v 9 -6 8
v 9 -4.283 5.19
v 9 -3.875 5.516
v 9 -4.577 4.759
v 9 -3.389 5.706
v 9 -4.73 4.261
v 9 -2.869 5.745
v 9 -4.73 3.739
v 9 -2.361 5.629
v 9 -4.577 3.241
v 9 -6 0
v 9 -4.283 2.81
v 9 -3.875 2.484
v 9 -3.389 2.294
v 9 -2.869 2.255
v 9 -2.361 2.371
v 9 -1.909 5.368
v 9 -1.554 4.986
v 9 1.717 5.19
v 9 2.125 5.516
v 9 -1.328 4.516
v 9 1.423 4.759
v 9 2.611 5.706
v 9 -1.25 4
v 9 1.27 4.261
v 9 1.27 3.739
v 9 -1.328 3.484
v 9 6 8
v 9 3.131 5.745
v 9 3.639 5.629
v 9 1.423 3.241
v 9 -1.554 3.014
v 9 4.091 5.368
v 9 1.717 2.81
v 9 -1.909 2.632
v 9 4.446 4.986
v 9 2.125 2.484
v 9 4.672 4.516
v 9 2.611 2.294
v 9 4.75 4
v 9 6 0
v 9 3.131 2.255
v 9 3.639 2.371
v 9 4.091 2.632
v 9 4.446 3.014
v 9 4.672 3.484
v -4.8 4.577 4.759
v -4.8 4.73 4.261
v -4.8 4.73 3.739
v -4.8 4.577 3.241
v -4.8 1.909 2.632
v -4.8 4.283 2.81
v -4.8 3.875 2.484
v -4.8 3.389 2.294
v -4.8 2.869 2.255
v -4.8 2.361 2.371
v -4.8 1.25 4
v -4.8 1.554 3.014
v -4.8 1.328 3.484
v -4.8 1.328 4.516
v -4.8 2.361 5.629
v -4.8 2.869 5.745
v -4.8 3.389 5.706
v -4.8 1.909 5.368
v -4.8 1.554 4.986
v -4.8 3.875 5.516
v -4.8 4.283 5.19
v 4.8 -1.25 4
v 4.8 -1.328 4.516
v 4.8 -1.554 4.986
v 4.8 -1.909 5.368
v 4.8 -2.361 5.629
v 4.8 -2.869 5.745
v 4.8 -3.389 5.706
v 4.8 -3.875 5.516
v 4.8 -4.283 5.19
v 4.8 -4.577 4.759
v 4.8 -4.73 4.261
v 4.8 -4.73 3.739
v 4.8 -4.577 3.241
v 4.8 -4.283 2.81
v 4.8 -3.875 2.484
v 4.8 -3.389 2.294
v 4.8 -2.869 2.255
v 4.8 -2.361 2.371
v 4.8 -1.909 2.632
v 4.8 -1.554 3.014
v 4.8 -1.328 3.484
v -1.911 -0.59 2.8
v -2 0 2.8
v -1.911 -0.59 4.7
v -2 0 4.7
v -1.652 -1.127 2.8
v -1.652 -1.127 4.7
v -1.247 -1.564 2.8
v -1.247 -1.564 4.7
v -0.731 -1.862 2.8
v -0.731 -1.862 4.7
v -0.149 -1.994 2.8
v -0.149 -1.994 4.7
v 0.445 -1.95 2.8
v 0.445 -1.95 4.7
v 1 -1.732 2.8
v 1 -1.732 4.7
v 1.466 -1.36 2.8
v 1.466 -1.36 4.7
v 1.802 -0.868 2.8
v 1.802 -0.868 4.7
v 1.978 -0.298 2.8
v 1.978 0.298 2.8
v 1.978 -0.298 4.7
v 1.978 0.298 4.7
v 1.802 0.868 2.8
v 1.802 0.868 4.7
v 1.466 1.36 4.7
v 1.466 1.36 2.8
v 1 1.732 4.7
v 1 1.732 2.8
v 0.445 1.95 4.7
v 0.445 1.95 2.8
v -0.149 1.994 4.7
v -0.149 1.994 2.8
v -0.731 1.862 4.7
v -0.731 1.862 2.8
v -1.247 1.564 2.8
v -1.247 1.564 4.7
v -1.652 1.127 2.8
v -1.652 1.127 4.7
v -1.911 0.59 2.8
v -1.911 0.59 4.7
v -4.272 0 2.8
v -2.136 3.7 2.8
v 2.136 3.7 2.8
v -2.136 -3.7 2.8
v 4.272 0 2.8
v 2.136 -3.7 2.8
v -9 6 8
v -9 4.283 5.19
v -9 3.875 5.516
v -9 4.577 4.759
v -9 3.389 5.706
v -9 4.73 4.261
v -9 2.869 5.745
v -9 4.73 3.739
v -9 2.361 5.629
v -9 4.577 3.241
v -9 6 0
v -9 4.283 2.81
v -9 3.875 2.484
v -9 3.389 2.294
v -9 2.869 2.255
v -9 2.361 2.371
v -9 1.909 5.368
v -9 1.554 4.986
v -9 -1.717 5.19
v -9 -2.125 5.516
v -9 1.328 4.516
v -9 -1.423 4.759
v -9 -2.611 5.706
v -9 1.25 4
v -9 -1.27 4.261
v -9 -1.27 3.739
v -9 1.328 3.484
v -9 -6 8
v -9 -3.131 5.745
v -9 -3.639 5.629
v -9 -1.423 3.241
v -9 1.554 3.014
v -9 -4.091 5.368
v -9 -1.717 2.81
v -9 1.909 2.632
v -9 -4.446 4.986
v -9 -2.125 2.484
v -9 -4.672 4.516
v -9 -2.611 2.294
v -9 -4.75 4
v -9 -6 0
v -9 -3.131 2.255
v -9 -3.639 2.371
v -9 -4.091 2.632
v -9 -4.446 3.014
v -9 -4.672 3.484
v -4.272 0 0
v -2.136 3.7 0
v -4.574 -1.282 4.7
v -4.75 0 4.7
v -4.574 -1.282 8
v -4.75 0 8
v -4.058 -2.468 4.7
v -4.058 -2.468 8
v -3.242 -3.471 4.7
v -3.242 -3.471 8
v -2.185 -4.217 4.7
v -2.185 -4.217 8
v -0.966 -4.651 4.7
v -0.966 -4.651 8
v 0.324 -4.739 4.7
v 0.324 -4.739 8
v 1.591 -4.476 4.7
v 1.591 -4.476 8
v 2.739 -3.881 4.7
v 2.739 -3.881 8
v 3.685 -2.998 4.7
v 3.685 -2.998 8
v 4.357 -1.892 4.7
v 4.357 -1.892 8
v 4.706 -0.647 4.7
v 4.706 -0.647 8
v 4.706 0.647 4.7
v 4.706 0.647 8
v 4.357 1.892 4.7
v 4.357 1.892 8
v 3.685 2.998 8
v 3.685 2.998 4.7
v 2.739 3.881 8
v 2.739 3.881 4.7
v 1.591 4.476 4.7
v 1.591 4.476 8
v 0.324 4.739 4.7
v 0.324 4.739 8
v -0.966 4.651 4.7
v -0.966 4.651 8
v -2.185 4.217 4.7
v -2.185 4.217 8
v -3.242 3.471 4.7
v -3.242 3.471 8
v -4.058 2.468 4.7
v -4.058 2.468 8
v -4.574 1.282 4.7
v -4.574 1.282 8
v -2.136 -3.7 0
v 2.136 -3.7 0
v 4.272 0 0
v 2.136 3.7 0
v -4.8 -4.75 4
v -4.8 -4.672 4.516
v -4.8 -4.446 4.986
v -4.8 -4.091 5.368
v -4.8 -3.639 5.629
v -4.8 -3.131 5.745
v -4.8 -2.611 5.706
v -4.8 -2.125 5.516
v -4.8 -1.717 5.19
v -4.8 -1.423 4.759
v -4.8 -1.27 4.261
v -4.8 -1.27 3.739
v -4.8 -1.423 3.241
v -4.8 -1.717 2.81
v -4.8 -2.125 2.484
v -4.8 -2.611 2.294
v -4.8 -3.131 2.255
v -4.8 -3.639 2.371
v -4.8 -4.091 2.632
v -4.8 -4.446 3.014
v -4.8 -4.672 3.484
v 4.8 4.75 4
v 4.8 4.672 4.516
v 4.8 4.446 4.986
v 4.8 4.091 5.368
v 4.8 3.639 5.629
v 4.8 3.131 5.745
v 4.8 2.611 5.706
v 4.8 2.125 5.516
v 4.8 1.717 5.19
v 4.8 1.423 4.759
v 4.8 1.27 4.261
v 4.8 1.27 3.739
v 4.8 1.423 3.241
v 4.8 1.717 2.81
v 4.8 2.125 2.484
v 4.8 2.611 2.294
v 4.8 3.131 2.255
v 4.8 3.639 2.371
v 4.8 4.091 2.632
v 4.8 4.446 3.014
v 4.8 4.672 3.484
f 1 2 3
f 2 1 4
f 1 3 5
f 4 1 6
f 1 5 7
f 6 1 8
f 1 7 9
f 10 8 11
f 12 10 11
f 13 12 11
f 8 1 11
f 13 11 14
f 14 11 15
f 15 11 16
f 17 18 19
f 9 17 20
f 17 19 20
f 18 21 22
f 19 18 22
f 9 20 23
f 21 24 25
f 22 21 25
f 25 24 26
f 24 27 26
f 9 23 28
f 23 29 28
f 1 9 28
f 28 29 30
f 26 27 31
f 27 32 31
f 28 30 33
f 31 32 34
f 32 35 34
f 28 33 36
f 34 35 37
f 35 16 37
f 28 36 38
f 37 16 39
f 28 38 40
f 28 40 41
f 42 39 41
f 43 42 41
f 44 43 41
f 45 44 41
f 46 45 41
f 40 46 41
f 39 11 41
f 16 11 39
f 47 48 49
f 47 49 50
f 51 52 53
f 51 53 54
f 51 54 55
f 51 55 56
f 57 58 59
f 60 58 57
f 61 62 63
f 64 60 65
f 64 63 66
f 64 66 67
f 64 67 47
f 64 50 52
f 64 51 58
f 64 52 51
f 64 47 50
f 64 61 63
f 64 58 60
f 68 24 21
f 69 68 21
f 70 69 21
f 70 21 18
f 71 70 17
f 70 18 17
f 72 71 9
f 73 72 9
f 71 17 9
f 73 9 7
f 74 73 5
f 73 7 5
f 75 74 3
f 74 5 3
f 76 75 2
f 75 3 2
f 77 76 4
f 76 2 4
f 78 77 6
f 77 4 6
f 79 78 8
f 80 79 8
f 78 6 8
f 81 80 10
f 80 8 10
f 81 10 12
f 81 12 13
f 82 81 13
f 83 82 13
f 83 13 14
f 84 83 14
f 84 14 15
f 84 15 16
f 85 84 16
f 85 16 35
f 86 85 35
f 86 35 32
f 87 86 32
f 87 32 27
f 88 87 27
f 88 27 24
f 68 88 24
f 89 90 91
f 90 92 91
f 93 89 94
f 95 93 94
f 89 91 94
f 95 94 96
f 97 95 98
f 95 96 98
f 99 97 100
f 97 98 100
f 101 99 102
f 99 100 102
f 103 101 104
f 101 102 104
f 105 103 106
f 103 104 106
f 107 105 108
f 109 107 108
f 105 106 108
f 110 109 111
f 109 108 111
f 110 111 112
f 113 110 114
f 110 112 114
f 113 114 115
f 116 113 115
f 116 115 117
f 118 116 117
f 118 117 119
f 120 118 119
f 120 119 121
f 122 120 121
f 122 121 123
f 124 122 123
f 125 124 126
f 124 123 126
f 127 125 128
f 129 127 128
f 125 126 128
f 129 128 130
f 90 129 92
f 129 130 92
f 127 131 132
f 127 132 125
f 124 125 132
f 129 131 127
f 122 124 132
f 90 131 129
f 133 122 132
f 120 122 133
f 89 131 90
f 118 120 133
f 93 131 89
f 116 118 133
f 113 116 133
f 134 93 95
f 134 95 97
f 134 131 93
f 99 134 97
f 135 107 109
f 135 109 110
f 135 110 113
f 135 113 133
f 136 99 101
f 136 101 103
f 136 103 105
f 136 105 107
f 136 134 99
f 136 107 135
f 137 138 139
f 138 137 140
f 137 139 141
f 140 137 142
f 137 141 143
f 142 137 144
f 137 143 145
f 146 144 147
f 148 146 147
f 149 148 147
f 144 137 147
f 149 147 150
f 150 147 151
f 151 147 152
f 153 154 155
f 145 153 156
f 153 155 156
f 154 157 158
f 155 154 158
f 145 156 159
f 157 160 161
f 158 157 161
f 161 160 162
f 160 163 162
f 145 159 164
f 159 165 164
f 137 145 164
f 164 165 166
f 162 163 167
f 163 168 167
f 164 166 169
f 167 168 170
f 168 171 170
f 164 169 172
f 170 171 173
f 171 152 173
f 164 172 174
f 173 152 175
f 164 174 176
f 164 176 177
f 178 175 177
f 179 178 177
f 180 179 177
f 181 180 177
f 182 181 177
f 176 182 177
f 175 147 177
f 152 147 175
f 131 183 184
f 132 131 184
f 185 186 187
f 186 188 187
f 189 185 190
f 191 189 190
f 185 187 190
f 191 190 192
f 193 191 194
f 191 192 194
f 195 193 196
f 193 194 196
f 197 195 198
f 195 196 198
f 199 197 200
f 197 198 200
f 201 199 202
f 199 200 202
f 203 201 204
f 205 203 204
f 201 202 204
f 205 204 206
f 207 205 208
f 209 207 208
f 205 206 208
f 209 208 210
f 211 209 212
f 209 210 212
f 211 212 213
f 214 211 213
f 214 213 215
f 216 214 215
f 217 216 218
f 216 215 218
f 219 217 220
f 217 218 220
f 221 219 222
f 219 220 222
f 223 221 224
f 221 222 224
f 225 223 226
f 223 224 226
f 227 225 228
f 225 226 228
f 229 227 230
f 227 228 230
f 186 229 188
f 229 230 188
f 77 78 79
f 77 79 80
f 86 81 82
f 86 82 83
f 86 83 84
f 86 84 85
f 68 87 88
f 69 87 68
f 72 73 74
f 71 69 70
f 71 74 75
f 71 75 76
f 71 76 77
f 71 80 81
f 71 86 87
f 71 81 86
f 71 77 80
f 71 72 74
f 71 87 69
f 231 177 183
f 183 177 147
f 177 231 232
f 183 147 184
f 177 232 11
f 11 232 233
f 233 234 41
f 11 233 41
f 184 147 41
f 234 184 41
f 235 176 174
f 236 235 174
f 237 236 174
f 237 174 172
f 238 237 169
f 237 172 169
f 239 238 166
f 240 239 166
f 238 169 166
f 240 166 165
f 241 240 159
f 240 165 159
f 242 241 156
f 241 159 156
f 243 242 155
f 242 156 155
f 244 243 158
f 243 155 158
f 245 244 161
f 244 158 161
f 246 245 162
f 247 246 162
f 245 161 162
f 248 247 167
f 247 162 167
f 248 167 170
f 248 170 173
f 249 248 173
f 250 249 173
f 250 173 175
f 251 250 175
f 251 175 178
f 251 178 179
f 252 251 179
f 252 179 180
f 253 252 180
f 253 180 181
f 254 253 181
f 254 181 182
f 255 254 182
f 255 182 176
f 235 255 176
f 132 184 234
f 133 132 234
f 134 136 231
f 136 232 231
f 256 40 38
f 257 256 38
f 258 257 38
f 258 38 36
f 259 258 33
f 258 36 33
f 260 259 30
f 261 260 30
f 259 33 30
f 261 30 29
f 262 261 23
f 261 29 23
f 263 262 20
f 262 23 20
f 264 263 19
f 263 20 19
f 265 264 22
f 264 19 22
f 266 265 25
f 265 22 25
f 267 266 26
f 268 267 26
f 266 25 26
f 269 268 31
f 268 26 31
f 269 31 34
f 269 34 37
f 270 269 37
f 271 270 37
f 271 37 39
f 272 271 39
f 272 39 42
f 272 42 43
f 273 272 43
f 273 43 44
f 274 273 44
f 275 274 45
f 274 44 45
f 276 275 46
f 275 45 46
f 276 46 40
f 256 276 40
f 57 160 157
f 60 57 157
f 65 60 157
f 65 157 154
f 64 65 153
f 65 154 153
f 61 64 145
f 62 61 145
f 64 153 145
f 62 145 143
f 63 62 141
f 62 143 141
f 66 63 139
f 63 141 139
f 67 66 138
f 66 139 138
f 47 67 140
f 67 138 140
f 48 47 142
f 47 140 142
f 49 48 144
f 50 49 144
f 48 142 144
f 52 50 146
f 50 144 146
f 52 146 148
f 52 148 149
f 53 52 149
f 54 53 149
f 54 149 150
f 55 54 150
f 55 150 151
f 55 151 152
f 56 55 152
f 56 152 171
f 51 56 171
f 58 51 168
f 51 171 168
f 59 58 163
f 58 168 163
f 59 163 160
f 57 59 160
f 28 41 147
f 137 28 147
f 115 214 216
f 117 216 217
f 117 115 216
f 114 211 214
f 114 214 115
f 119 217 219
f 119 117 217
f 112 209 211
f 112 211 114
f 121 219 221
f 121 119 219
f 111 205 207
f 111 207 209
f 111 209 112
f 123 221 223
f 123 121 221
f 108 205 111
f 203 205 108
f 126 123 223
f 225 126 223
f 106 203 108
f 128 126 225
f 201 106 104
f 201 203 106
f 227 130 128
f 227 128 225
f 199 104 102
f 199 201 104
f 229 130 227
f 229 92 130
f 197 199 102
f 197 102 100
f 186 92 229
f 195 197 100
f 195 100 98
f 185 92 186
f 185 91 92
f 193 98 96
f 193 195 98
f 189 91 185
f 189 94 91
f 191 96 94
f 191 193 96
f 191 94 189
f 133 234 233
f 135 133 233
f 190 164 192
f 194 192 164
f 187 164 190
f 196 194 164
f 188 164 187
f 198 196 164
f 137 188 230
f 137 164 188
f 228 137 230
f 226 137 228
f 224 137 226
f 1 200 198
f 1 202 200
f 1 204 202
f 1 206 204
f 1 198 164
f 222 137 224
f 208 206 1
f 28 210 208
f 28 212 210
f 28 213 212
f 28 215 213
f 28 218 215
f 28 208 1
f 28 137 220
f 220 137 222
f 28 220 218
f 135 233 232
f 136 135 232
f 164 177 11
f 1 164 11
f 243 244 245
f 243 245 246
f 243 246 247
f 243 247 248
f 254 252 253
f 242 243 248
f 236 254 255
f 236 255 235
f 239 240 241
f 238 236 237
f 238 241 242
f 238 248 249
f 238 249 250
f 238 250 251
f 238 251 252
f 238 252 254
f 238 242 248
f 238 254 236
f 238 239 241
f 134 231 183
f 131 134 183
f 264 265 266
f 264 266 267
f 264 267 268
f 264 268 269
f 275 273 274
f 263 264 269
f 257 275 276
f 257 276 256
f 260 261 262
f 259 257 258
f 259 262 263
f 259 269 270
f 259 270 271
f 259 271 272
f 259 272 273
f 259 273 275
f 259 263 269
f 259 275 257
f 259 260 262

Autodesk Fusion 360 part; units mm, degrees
sketch "Sketch1" plane through (0, 0, 0) normal (0, 0, 1) x (1, 0, 0)
  line L0 (-9, -6) -> (9, -6)
  line L1 (9, -6) -> (9, 6)
  line L2 (9, 6) -> (-9, 6)
  line L3 (-9, 6) -> (-9, -6)
  dimension "d1" = 18
  dimension "d2" = 12
  dimension "d5" = 9
  dimension "d6" = 6
extrude "Extrude1" add sketch "Sketch1" along normal blind 8
sketch "Sketch2" plane through (0, 0, 0) normal (0, 0, -1) x (1, 0, 0)
  line L0 (-9, 6) -> (-9, -6)
  line L1 (-9, -6) -> (9, -6)
  line L2 (9, -6) -> (9, 6)
  line L3 (9, 6) -> (-9, 6)
sketch "Sketch3" plane through (0, 0, 0) normal (0, 0, -1) x (1, 0, 0)
  line L0 (2.1362, -3.7) -> (4.2724, 0)
  line L1 (4.2724, 0) -> (2.1362, 3.7)
  line L2 (2.1362, 3.7) -> (-2.1362, 3.7)
  line L3 (-2.1362, 3.7) -> (-4.2724, 0)
  line L4 (-4.2724, 0) -> (-2.1362, -3.7)
  line L5 (-2.1362, -3.7) -> (2.1362, -3.7)
  dimension "d12" = 3.7
extrude "Extrude2" cut sketch "Sketch3" against normal blind 2.8
sketch "Sketch4" plane through (0, 0, 8) normal (0, 0, 1) x (-1, 0, 0)
  line L0 (9, -6) -> (9, 6)
  line L1 (9, 6) -> (-9, 6)
  line L2 (-9, 6) -> (-9, -6)
  line L3 (-9, -6) -> (9, -6)
  circle A0 centre (0, 0) radius 2
  dimension "d9" = 4
extrude "Extrude3" cut sketch "Sketch4" against normal blind 10 contours A0
sketch "Sketch5" plane through (0, 0, 8) normal (0, 0, 1) x (-1, 0, 0)
  circle A0 centre (0, 0) radius 2
  line L0 (9, -6) -> (9, 6)
  line L1 (9, 6) -> (-9, 6)
  line L2 (-9, 6) -> (-9, -6)
  line L3 (-9, -6) -> (9, -6)
  circle A1 centre (0, 0) radius 4.75
  dimension "d21" = 9.5
extrude "Extrude4" cut sketch "Sketch5" against normal blind 3.3 contours A1
sketch "Sketch6" plane through (9, 0, 0) normal (1, 0, 0) x (0, 1, 0)
  line L0 (-6, 0) -> (6, 0)
  line L1 (6, 0) -> (6, 8)
  line L2 (6, 8) -> (-6, 8)
  line L3 (-6, 8) -> (-6, 0)
  line L4 (-6, 4) -> (6, 4) construction
  circle A0 centre (-3, 4) radius 1.75
  circle A1 centre (3, 4) radius 1.75
  dimension "d15" = 3.5
  dimension "d16" = 3.5
  dimension "d17" = 3
  dimension "d18" = 3
extrude "Extrude5" cut sketch "Sketch6" against normal blind 4.2 contours A0 | A1
sketch "Sketch7" plane through (-9, 0, 0) normal (-1, 0, 0) x (0, -1, 0)
  line L0 (-6, 0) -> (6, 0)
  line L1 (6, 0) -> (6, 8)
  line L2 (6, 8) -> (-6, 8)
  line L3 (-6, 8) -> (-6, 0)
  line L4 (-6, 4) -> (6, 4) construction
  circle A0 centre (-3, 4) radius 1.75
  circle A1 centre (3, 4) radius 1.75
  dimension "d24" = 3.5
  dimension "d25" = 3.5
  dimension "d26" = 3
  dimension "d27" = 3
extrude "Extrude6" cut sketch "Sketch7" against normal blind 4.2 contours A0 | A1
